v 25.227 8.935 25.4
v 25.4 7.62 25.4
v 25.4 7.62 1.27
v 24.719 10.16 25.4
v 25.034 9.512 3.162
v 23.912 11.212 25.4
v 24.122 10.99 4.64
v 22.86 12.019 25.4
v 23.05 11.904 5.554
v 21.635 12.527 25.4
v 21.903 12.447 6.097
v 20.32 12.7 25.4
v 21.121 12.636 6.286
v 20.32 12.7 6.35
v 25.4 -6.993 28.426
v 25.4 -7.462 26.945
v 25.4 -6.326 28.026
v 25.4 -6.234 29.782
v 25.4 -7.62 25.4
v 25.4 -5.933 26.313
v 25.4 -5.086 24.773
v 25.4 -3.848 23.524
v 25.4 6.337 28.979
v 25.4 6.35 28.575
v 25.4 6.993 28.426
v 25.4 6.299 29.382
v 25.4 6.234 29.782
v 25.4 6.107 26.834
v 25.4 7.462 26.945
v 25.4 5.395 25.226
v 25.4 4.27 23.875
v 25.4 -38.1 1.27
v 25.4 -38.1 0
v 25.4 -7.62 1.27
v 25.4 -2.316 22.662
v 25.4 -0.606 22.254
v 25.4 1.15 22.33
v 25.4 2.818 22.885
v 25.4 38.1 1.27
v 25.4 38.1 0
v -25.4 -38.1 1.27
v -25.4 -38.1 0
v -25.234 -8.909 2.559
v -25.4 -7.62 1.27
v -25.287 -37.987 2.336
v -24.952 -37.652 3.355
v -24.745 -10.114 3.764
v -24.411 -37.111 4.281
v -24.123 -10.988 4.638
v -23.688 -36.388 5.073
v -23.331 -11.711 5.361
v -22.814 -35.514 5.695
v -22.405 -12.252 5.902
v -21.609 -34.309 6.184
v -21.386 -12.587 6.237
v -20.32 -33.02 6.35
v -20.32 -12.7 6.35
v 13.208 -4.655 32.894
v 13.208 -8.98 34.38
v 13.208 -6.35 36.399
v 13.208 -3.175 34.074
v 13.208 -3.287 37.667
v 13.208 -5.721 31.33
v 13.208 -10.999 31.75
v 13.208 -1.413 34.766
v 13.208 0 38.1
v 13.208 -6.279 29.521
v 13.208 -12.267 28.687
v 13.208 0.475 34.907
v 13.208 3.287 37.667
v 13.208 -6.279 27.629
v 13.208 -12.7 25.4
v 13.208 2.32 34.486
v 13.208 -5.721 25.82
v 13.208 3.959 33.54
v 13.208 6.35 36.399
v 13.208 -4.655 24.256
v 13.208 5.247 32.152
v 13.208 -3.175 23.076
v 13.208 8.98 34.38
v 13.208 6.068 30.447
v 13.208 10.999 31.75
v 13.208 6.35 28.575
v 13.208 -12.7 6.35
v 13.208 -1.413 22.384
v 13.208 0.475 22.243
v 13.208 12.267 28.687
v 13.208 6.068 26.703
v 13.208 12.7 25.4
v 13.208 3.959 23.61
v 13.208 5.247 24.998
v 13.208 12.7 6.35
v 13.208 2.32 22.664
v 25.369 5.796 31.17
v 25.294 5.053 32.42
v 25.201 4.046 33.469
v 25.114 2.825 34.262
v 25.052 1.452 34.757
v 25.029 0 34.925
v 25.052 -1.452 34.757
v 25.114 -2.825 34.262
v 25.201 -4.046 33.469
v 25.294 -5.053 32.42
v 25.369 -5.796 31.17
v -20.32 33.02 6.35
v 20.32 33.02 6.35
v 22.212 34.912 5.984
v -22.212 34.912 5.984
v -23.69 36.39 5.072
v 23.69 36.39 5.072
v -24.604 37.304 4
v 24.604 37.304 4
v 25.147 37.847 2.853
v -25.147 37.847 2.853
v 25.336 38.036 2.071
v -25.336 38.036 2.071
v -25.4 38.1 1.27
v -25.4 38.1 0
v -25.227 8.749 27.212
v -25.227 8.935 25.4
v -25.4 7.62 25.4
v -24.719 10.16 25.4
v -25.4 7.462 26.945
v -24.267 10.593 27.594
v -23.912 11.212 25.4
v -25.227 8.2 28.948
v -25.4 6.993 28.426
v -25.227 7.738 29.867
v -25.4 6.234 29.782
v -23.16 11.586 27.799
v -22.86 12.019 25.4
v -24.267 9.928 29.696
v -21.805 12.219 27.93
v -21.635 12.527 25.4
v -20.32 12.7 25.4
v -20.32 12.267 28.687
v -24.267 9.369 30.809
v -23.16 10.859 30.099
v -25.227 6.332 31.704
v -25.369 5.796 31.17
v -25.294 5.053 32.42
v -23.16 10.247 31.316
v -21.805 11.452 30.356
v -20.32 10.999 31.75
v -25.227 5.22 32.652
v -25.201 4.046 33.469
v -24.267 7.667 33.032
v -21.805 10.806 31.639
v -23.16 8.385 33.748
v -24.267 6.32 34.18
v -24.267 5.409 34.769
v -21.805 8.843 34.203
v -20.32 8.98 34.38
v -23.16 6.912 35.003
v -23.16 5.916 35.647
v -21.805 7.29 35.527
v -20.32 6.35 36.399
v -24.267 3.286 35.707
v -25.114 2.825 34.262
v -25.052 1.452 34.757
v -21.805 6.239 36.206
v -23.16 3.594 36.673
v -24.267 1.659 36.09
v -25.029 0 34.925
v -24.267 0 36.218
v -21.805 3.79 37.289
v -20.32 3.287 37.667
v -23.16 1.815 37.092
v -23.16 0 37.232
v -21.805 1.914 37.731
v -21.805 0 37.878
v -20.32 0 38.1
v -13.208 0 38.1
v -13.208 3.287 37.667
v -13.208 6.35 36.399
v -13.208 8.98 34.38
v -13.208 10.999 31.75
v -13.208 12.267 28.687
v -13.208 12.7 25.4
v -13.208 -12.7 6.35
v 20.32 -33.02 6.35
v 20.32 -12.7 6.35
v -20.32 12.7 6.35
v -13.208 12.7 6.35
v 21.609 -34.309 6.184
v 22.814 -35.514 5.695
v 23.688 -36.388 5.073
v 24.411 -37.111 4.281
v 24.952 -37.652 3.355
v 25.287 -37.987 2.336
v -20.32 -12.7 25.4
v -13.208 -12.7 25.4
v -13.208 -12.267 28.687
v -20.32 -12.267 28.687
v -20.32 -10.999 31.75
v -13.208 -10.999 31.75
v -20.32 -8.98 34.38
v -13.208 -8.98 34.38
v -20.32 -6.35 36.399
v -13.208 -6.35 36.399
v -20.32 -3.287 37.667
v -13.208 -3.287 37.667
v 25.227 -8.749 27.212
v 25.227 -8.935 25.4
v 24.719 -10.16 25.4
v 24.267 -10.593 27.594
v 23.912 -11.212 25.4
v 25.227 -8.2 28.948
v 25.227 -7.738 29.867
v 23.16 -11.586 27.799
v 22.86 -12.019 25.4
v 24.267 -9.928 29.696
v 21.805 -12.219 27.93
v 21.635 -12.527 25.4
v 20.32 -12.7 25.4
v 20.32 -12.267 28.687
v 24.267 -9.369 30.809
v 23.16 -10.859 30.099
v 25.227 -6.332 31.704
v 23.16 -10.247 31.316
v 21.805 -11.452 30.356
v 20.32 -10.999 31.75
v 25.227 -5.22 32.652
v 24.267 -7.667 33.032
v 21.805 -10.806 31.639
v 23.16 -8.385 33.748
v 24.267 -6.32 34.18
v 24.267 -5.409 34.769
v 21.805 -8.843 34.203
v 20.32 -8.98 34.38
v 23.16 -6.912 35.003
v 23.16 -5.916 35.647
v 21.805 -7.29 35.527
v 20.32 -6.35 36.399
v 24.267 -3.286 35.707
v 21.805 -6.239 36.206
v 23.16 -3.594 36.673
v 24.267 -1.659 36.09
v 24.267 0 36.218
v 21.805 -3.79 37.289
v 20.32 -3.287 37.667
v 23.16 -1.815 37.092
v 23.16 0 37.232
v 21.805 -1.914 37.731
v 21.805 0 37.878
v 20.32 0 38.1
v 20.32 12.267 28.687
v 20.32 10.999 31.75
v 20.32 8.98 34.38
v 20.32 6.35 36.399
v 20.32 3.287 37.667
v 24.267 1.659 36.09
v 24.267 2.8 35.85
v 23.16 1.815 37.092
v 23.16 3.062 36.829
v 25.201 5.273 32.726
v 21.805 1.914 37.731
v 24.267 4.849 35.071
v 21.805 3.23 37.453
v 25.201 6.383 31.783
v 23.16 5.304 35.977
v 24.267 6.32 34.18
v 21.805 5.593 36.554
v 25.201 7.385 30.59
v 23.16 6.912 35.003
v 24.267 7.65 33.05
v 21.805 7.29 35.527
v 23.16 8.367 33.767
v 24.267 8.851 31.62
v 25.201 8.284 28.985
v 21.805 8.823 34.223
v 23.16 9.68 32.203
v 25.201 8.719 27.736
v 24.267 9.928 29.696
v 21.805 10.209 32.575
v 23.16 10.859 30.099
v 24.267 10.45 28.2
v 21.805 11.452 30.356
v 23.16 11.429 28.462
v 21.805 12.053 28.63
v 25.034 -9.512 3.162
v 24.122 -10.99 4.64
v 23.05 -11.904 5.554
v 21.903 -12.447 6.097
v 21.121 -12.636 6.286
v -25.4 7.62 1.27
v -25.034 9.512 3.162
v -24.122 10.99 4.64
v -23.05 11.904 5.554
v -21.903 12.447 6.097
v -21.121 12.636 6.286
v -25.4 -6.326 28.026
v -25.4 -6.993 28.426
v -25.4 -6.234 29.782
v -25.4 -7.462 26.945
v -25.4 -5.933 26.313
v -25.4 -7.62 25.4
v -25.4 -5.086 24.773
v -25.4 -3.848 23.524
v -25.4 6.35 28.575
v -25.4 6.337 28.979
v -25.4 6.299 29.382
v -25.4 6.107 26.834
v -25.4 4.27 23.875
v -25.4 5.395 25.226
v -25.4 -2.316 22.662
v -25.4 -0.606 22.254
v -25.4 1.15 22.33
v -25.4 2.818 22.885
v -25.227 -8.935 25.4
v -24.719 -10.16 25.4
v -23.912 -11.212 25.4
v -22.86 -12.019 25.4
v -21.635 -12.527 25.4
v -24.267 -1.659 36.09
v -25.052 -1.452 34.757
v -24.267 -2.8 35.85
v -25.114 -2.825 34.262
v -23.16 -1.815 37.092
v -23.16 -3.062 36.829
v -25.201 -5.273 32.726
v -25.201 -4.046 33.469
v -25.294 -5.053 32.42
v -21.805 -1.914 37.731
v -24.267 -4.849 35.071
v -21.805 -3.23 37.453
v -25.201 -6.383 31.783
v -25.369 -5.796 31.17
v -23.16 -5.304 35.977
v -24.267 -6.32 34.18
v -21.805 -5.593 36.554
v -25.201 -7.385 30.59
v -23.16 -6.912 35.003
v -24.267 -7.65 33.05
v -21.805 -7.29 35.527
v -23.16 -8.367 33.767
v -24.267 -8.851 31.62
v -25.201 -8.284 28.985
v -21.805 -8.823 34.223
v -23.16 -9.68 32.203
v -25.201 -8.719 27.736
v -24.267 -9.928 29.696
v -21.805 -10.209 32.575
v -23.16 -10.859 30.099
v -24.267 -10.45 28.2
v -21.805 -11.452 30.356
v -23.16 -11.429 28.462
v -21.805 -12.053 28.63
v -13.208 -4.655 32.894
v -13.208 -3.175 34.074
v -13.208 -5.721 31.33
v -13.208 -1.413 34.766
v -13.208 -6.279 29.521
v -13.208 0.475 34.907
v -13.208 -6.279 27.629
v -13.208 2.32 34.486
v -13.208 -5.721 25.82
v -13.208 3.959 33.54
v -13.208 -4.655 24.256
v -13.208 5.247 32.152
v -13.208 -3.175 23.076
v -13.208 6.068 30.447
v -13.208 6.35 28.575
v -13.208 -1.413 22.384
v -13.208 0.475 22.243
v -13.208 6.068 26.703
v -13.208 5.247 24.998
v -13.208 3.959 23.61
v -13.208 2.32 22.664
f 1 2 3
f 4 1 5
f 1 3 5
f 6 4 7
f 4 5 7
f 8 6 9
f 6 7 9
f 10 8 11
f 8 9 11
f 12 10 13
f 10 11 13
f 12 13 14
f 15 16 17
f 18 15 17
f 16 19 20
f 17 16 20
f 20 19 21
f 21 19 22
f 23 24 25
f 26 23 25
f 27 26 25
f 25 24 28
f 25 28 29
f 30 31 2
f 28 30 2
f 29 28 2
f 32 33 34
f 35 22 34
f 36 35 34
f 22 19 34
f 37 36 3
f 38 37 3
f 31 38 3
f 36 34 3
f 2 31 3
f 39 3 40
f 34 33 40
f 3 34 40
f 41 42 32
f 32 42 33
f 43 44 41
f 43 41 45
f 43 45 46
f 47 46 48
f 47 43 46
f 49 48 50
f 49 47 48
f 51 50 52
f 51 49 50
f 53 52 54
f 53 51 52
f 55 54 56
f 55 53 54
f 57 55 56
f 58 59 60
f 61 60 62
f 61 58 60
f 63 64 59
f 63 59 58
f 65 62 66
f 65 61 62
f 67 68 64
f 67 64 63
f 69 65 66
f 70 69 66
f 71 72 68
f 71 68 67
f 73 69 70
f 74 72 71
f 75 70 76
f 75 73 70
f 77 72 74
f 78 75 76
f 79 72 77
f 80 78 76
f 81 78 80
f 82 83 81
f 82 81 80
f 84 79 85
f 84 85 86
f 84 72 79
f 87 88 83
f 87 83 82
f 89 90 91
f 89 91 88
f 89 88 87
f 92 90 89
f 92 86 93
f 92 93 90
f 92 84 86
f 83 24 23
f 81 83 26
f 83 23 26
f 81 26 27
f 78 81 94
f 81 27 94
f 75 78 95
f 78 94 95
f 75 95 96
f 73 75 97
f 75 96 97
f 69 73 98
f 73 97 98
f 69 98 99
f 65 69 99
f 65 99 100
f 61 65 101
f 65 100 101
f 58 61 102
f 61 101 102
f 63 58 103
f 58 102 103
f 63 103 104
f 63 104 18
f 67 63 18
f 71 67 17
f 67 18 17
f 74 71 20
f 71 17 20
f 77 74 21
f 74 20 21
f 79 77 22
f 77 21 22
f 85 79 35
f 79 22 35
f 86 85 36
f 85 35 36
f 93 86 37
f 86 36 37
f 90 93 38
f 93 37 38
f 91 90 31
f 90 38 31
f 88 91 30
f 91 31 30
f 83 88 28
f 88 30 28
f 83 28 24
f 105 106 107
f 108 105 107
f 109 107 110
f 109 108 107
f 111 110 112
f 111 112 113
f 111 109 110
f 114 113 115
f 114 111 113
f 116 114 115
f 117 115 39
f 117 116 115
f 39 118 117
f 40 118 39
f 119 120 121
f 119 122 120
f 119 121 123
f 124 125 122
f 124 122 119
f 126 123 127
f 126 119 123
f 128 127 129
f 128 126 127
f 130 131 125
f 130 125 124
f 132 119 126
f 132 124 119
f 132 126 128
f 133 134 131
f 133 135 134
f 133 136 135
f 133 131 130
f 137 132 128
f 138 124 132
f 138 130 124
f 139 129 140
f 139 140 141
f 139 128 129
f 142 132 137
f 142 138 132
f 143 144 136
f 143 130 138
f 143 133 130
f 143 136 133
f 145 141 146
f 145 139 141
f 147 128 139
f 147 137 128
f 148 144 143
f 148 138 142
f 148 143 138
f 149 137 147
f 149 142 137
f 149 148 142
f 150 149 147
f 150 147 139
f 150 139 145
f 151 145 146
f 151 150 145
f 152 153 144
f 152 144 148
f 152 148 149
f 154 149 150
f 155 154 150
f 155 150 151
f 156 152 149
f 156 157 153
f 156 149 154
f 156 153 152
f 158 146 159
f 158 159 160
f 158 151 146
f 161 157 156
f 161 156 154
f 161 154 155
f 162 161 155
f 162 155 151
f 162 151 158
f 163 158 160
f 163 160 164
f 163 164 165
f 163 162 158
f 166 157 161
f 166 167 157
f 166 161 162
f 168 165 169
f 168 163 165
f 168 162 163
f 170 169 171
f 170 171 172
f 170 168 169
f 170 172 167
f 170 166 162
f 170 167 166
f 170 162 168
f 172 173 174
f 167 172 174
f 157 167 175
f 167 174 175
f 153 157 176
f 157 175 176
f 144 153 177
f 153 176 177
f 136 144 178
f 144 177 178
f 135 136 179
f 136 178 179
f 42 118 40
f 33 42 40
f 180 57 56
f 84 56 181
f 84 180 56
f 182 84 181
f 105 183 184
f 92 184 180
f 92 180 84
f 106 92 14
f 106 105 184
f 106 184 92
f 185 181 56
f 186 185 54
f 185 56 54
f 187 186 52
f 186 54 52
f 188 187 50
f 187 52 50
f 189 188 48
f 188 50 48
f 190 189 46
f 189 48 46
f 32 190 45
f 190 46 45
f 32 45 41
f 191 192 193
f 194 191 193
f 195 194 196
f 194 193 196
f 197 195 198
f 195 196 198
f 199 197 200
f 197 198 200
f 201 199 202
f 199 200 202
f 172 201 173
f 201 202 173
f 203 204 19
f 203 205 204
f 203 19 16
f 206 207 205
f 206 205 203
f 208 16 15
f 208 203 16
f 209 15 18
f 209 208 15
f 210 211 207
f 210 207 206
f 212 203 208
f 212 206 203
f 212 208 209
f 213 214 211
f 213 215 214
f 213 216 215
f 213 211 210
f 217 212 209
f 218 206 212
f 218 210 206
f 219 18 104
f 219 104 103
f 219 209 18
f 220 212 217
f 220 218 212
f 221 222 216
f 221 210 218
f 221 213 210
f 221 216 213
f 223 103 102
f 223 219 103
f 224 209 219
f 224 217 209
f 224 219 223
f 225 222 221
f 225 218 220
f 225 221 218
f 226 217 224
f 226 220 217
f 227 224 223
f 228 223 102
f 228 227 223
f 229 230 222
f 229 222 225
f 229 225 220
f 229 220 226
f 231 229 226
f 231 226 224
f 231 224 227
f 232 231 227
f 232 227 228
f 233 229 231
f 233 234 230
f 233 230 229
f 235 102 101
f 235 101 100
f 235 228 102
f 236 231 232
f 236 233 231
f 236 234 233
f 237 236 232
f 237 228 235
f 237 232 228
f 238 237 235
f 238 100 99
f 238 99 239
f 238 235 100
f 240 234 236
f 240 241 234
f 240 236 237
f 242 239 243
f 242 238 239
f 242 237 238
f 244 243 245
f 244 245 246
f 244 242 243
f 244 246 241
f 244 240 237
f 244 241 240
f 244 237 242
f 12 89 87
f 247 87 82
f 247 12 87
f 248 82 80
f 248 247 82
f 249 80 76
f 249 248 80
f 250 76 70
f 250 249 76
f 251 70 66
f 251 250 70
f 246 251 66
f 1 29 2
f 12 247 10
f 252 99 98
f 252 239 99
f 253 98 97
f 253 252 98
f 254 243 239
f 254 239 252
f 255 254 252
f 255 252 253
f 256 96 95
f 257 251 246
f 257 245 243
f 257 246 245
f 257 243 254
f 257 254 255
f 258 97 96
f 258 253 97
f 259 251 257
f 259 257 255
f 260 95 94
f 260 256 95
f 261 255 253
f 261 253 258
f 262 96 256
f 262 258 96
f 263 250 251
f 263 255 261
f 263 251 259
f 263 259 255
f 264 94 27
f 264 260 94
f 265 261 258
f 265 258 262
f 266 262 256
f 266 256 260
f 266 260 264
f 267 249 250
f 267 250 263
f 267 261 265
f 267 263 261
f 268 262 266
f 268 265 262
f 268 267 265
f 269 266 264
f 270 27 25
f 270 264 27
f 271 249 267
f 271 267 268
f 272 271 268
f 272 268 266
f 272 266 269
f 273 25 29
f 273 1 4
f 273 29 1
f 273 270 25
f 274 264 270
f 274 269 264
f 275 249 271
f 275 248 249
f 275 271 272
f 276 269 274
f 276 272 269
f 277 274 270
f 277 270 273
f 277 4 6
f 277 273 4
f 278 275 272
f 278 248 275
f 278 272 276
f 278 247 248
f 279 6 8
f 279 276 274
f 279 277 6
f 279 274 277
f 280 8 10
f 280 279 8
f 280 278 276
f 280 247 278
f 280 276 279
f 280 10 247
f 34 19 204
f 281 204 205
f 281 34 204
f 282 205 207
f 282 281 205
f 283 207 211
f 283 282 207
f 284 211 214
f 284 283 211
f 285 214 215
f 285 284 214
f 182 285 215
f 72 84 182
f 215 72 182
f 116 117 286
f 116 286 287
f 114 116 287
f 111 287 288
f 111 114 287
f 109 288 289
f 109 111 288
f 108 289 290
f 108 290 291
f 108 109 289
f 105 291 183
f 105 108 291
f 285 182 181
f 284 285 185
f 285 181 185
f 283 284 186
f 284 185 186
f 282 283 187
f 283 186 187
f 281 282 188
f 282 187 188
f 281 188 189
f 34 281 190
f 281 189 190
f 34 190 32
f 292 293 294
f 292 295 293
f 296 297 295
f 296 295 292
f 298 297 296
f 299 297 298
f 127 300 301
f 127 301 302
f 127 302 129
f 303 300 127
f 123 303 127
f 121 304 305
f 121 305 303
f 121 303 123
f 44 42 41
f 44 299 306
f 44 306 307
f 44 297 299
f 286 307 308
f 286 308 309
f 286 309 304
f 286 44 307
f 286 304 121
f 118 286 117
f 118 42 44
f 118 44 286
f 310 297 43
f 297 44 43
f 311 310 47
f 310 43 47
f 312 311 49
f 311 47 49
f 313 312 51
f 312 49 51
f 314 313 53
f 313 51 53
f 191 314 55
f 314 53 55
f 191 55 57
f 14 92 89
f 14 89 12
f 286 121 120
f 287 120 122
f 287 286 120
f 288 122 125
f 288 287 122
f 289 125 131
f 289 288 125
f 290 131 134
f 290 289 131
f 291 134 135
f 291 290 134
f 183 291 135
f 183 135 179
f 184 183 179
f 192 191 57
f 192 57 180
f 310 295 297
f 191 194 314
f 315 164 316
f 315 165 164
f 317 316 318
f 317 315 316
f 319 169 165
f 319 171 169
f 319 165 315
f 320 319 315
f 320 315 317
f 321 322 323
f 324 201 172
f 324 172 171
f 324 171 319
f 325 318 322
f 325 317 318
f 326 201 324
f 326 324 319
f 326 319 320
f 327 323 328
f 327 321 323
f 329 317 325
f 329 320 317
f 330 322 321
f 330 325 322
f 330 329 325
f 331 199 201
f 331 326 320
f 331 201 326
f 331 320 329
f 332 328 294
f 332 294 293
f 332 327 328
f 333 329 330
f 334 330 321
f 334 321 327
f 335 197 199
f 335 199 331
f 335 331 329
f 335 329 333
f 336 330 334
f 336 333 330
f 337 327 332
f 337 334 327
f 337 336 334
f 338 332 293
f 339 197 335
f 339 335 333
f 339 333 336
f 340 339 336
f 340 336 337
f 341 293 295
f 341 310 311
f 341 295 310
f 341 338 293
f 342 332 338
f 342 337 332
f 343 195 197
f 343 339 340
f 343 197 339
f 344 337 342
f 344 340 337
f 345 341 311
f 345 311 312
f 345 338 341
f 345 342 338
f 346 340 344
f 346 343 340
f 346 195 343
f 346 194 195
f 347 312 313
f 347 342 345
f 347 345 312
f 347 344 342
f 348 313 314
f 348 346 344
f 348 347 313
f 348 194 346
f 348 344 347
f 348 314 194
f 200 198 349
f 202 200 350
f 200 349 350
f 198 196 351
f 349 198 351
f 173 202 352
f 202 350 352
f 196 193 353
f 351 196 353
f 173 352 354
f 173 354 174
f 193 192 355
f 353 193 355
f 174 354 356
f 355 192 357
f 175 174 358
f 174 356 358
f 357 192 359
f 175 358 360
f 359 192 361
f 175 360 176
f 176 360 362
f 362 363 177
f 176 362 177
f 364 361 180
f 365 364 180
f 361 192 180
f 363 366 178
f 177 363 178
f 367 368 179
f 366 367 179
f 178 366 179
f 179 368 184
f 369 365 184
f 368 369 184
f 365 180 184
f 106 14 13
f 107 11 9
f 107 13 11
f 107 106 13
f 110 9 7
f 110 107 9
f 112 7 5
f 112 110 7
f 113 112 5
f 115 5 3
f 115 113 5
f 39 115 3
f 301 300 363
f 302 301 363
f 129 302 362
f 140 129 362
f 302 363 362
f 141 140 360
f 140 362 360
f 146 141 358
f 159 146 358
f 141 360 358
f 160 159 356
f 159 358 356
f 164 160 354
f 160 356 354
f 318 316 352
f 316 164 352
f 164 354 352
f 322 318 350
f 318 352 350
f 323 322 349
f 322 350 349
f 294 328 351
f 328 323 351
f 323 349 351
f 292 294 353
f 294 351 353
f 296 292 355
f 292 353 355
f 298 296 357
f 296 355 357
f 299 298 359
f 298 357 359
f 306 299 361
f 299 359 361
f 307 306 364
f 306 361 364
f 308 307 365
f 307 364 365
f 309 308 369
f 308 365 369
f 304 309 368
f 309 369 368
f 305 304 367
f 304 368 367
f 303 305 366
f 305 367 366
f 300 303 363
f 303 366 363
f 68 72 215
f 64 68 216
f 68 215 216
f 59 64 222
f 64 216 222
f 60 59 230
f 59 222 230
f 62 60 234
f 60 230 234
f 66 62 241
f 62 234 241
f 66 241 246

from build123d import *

# Parameters (mm, degrees)
F0_W         = 50.8
F0_H         = 76.2
F1_DEPTH     = 6.35
F2_W         = 12.192
F2_H         = 25.4
F3_DEPTH     = 31.75
F5_D         = 12.7
F5_DEPTH     = 254
F5_TIP       = 3.8154649308
F6_R         = 12.69999
F7_T1_DEPTH  = 19.05001
F7_T3_DEPTH  = 76.2
F7_T5_DEPTH  = 38.1
F7_T7_DEPTH  = 38.1
F7_T9_DEPTH  = 2e-05
F7_T12_ANGLE = 90
F7_T14_ANGLE = 90
F7_T16_ANGLE = 90
F7_T18_ANGLE = 90
F7_T23_DEPTH = 31.75001
F7_T28_DEPTH = 38.1
F7_T35_DEPTH = 38.1
F7_T39_DEPTH = 31.75001
F7_T47_DEPTH = 38.1
F7_T51_DEPTH = 31.75001
F7_T59_DEPTH = 31.75001
F7_T64_DEPTH = 38.1


# Not quite as in the source:
# - a fillet or chamfer that OpenCascade refuses, or shapes differently, is made with other operations: its cross-section is extruded or revolved along the edge and cut away or added
# - a fillet or chamfer is up to 0.001 mm smaller than in the source, because OpenCascade refuses the exact size


with BuildPart() as f1:
    # F0 (on Top) → F1 (new body)
    with BuildSketch(Plane.XY):
        Rectangle(F0_W, F0_H)
    extrude(amount=F1_DEPTH)

    # F2 (on face) → F3 (join)
    with BuildSketch(Plane.XY.offset(6.35)):
        with Locations((-19.304, 0)):
            Rectangle(F2_W, F2_H)
        with Locations((19.304, 0)):
            Rectangle(F2_W, F2_H)
    extrude(amount=F3_DEPTH)

    # F5
    with Locations(Plane(origin=(-25.4, 0, 0), x_dir=(0, -1, 0), z_dir=(-1, 0, 0))):
        with Locations((0, 28.575)):
            Hole(F5_D / 2, depth=F5_DEPTH)
            with Locations((0, 0, -(F5_DEPTH + F5_TIP / 2))):  # 118° drill point
                Cone(0, F5_D / 2, F5_TIP, mode=Mode.SUBTRACT)

    # F6 (radius 12.7 in the source; OpenCascade refuses exactly that, so slightly less here)
    f6_edges = [f1.edges().sort_by_distance(p)[0] for p in [
        (19.304, 12.7, 38.1),
        (19.304, -12.7, 38.1),
        (-19.304, 12.7, 38.1),
        (-19.304, -12.7, 38.1),
    ]]
    fillet(f6_edges, radius=F6_R)

    # F7: fillet of radius 5.08 on 14 edges, made by hand

    # F7_s2 → F7_t1 (cut)
    with BuildSketch(Plane.XY.offset(6.35)):
        with BuildLine():
            ThreePointArc((-25.4, 7.62), (-23.9121024484, 11.2121024484), (-20.32, 12.7))
            Line((-20.32, 12.7), (-25.4, 12.7))
            Line((-25.4, 12.7), (-25.4, 7.62))
        make_face()
        with BuildLine():
            ThreePointArc((25.4, -7.62), (23.9121024484, -11.2121024484), (20.32, -12.7))
            Line((20.32, -12.7), (25.4, -12.7))
            Line((25.4, -12.7), (25.4, -7.62))
        make_face()
        with BuildLine():
            ThreePointArc((-25.4, -7.62), (-23.9121024484, -11.2121024484), (-20.32, -12.7))
            Line((-20.32, -12.7), (-25.4, -12.7))
            Line((-25.4, -12.7), (-25.4, -7.62))
        make_face()
        with BuildLine():
            ThreePointArc((25.4, 7.62), (23.9121024484, 11.2121024484), (20.32, 12.7))
            Line((20.32, 12.7), (25.4, 12.7))
            Line((25.4, 12.7), (25.4, 7.62))
        make_face()
    extrude(amount=F7_T1_DEPTH, mode=Mode.SUBTRACT)

    # F7_s4 → F7_t3 (cut)
    with BuildSketch(Plane.YZ.offset(-38.1)):
        with BuildLine():
            ThreePointArc((-33.02, 6.35), (-36.6121024484, 4.8621024484), (-38.1, 1.27))
            Line((-38.1, 1.27), (-38.1, 6.35))
            Line((-38.1, 6.35), (-33.02, 6.35))
        make_face()
        with BuildLine():
            ThreePointArc((33.02, 6.35), (36.6121024484, 4.8621024484), (38.1, 1.27))
            Line((38.1, 1.27), (38.1, 6.35))
            Line((38.1, 6.35), (33.02, 6.35))
        make_face()
    extrude(amount=F7_T3_DEPTH, mode=Mode.SUBTRACT)

    # F7_s6 → F7_t5 (cut)
    with BuildSketch(Plane.XZ.offset(12.7)):
        with BuildLine():
            ThreePointArc((20.32, 6.35), (23.9121024484, 4.8621024484), (25.4, 1.27))
            Line((25.4, 1.27), (25.4, 6.35))
            Line((25.4, 6.35), (20.32, 6.35))
        make_face()
        with BuildLine():
            ThreePointArc((-25.4, 1.27), (-23.9121024484, 4.8621024484), (-20.32, 6.35))
            Line((-20.32, 6.35), (-25.4, 6.35))
            Line((-25.4, 6.35), (-25.4, 1.27))
        make_face()
    extrude(amount=F7_T5_DEPTH, mode=Mode.SUBTRACT)

    # F7_s8 → F7_t7 (cut)
    with BuildSketch(Plane.XZ.offset(-50.8)):
        with BuildLine():
            ThreePointArc((20.32, 6.35), (23.9121024484, 4.8621024484), (25.4, 1.27))
            Line((25.4, 1.27), (25.4, 6.35))
            Line((25.4, 6.35), (20.32, 6.35))
        make_face()
        with BuildLine():
            ThreePointArc((-25.4, 1.27), (-23.9121024484, 4.8621024484), (-20.32, 6.35))
            Line((-20.32, 6.35), (-25.4, 6.35))
            Line((-25.4, 6.35), (-25.4, 1.27))
        make_face()
    extrude(amount=F7_T7_DEPTH, mode=Mode.SUBTRACT)

    # F7_s10 → F7_t9 (cut)
    with BuildSketch(Plane.XZ.offset(-1e-05)):
        with BuildLine():
            ThreePointArc((25.4, 33.02), (23.9121024484, 36.6121024484), (20.32, 38.1))
            Line((20.32, 38.1), (25.4, 38.1))
            Line((25.4, 38.1), (25.4, 33.02))
        make_face()
        with BuildLine():
            ThreePointArc((-25.4, 33.02), (-23.9121024484, 36.6121024484), (-20.32, 38.1))
            Line((-20.32, 38.1), (-25.4, 38.1))
            Line((-25.4, 38.1), (-25.4, 33.02))
        make_face()
    extrude(amount=F7_T9_DEPTH, mode=Mode.SUBTRACT)

    # F7_s11 → F7_t12 (revolve, cut)
    with BuildSketch(Plane.XY.offset(25.40001)):
        with BuildLine():
            ThreePointArc((-25.4, 7.62), (-23.9121024484, 11.2121024484), (-20.32, 12.7))
            Line((-20.32, 12.7), (-25.4, 12.7))
            Line((-25.4, 12.7), (-25.4, 7.62))
        make_face()
    revolve(axis=Axis((-25.4, 1e-05, 25.40001), (1, 0, 0)), revolution_arc=F7_T12_ANGLE, mode=Mode.SUBTRACT)

    # F7_s13 → F7_t14 (revolve, cut)
    with BuildSketch(Plane.XZ.offset(1e-05)):
        with BuildLine():
            ThreePointArc((-25.4, 33.02), (-23.9121024484, 36.6121024484), (-20.32, 38.1))
            Line((-20.32, 38.1), (-25.4, 38.1))
            Line((-25.4, 38.1), (-25.4, 33.02))
        make_face()
    revolve(axis=Axis((-25.4, -1e-05, 25.40001), (1, 0, 0)), revolution_arc=F7_T14_ANGLE, mode=Mode.SUBTRACT)

    # F7_s15 → F7_t16 (revolve, cut)
    with BuildSketch(Plane.XY.offset(25.40001)):
        with BuildLine():
            ThreePointArc((25.4, -7.62), (23.9121024484, -11.2121024484), (20.32, -12.7))
            Line((20.32, -12.7), (25.4, -12.7))
            Line((25.4, -12.7), (25.4, -7.62))
        make_face()
    revolve(axis=Axis((25.4, -1e-05, 25.40001), (-1, 0, 0)), revolution_arc=F7_T16_ANGLE, mode=Mode.SUBTRACT)

    # F7_s17 → F7_t18 (revolve, cut)
    with BuildSketch(Plane.XZ.offset(-1e-05)):
        with BuildLine():
            ThreePointArc((25.4, 33.02), (23.9121024484, 36.6121024484), (20.32, 38.1))
            Line((20.32, 38.1), (25.4, 38.1))
            Line((25.4, 38.1), (25.4, 33.02))
        make_face()
    revolve(axis=Axis((25.4, 1e-05, 25.40001), (-1, 0, 0)), revolution_arc=F7_T18_ANGLE, mode=Mode.SUBTRACT)


with BuildPart() as f7_tool21:
    # F7_s22 → F7_t23 (new body)
    with BuildSketch(Plane.XY.offset(-6.35)):
        with BuildLine():
            ThreePointArc((-25.4, 7.62), (-23.9121024484, 11.2121024484), (-20.32, 12.7))
            Line((-20.32, 12.7), (-25.4, 12.7))
            Line((-25.4, 12.7), (-25.4, 7.62))
        make_face()
    extrude(amount=F7_T23_DEPTH)

    split(bisect_by=Plane.XY.offset(6.35), keep=Keep.BOTTOM)

    split(bisect_by=Plane.XY, keep=Keep.TOP)


with BuildPart() as f7_tool26:
    # F7_s27 → F7_t28 (new body)
    with BuildSketch(Plane.XZ.offset(-38.1)):
        with BuildLine():
            ThreePointArc((-25.4, 1.27), (-23.9121024484, 4.8621024484), (-20.32, 6.35))
            Line((-20.32, 6.35), (-25.4, 6.35))
            Line((-25.4, 6.35), (-25.4, 1.27))
        make_face()
    extrude(amount=F7_T28_DEPTH)

    split(bisect_by=Plane.XZ.offset(-12.7), keep=Keep.TOP)


with BuildPart() as f7_tool21_1:
    add(f7_tool21.part)

    # F7_t30: intersect F7_tool26
    add(f7_tool26.part, mode=Mode.INTERSECT)


with BuildPart() as f1_1:
    add(f1.part)

    # F7_t19: cut F7_tool21
    add(f7_tool21_1.part, mode=Mode.SUBTRACT)


with BuildPart() as f7_tool33:
    # F7_s34 → F7_t35 (new body)
    with BuildSketch(Plane.XZ.offset(38.1)):
        with BuildLine():
            ThreePointArc((20.32, 6.35), (23.9121024484, 4.8621024484), (25.4, 1.27))
            Line((25.4, 1.27), (25.4, 6.35))
            Line((25.4, 6.35), (20.32, 6.35))
        make_face()
    extrude(amount=-F7_T35_DEPTH)

    split(bisect_by=Plane.XZ.offset(12.7), keep=Keep.BOTTOM)


with BuildPart() as f7_tool37:
    # F7_s38 → F7_t39 (new body)
    with BuildSketch(Plane.XY.offset(-6.35)):
        with BuildLine():
            ThreePointArc((25.4, -7.62), (23.9121024484, -11.2121024484), (20.32, -12.7))
            Line((20.32, -12.7), (25.4, -12.7))
            Line((25.4, -12.7), (25.4, -7.62))
        make_face()
    extrude(amount=F7_T39_DEPTH)

    split(bisect_by=Plane.XY.offset(6.35), keep=Keep.BOTTOM)

    split(bisect_by=Plane.XY, keep=Keep.TOP)


with BuildPart() as f7_tool33_1:
    add(f7_tool33.part)

    # F7_t42: intersect F7_tool37
    add(f7_tool37.part, mode=Mode.INTERSECT)


with BuildPart() as f1_2:
    add(f1_1.part)

    # F7_t31: cut F7_tool33
    add(f7_tool33_1.part, mode=Mode.SUBTRACT)


with BuildPart() as f7_tool45:
    # F7_s46 → F7_t47 (new body)
    with BuildSketch(Plane.XZ):
        with BuildLine():
            ThreePointArc((20.32, 6.35), (23.9121024484, 4.8621024484), (25.4, 1.27))
            Line((25.4, 1.27), (25.4, 6.35))
            Line((25.4, 6.35), (20.32, 6.35))
        make_face()
    extrude(amount=-F7_T47_DEPTH)

    split(bisect_by=Plane.XZ.offset(-12.7), keep=Keep.TOP)


with BuildPart() as f7_tool49:
    # F7_s50 → F7_t51 (new body)
    with BuildSketch(Plane.XY.offset(-6.35)):
        with BuildLine():
            ThreePointArc((25.4, 7.62), (23.9121024484, 11.2121024484), (20.32, 12.7))
            Line((20.32, 12.7), (25.4, 12.7))
            Line((25.4, 12.7), (25.4, 7.62))
        make_face()
    extrude(amount=F7_T51_DEPTH)

    split(bisect_by=Plane.XY.offset(6.35), keep=Keep.BOTTOM)

    split(bisect_by=Plane.XY, keep=Keep.TOP)


with BuildPart() as f7_tool45_1:
    add(f7_tool45.part)

    # F7_t54: intersect F7_tool49
    add(f7_tool49.part, mode=Mode.INTERSECT)


with BuildPart() as f1_3:
    add(f1_2.part)

    # F7_t43: cut F7_tool45
    add(f7_tool45_1.part, mode=Mode.SUBTRACT)


with BuildPart() as f7_tool57:
    # F7_s58 → F7_t59 (new body)
    with BuildSketch(Plane.XY.offset(-6.35)):
        with BuildLine():
            ThreePointArc((-25.4, -7.62), (-23.9121024484, -11.2121024484), (-20.32, -12.7))
            Line((-20.32, -12.7), (-25.4, -12.7))
            Line((-25.4, -12.7), (-25.4, -7.62))
        make_face()
    extrude(amount=F7_T59_DEPTH)

    split(bisect_by=Plane.XY.offset(6.35), keep=Keep.BOTTOM)

    split(bisect_by=Plane.XY, keep=Keep.TOP)


with BuildPart() as f7_tool62:
    # F7_s63 → F7_t64 (new body)
    with BuildSketch(Plane.XZ):
        with BuildLine():
            ThreePointArc((-25.4, 1.27), (-23.9121024484, 4.8621024484), (-20.32, 6.35))
            Line((-20.32, 6.35), (-25.4, 6.35))
            Line((-25.4, 6.35), (-25.4, 1.27))
        make_face()
    extrude(amount=F7_T64_DEPTH)

    split(bisect_by=Plane.XZ.offset(12.7), keep=Keep.BOTTOM)


with BuildPart() as f7_tool57_1:
    add(f7_tool57.part)

    # F7_t66: intersect F7_tool62
    add(f7_tool62.part, mode=Mode.INTERSECT)


with BuildPart() as f1_4:
    add(f1_3.part)

    # F7_t55: cut F7_tool57
    add(f7_tool57_1.part, mode=Mode.SUBTRACT)


solid = f1_4.part
